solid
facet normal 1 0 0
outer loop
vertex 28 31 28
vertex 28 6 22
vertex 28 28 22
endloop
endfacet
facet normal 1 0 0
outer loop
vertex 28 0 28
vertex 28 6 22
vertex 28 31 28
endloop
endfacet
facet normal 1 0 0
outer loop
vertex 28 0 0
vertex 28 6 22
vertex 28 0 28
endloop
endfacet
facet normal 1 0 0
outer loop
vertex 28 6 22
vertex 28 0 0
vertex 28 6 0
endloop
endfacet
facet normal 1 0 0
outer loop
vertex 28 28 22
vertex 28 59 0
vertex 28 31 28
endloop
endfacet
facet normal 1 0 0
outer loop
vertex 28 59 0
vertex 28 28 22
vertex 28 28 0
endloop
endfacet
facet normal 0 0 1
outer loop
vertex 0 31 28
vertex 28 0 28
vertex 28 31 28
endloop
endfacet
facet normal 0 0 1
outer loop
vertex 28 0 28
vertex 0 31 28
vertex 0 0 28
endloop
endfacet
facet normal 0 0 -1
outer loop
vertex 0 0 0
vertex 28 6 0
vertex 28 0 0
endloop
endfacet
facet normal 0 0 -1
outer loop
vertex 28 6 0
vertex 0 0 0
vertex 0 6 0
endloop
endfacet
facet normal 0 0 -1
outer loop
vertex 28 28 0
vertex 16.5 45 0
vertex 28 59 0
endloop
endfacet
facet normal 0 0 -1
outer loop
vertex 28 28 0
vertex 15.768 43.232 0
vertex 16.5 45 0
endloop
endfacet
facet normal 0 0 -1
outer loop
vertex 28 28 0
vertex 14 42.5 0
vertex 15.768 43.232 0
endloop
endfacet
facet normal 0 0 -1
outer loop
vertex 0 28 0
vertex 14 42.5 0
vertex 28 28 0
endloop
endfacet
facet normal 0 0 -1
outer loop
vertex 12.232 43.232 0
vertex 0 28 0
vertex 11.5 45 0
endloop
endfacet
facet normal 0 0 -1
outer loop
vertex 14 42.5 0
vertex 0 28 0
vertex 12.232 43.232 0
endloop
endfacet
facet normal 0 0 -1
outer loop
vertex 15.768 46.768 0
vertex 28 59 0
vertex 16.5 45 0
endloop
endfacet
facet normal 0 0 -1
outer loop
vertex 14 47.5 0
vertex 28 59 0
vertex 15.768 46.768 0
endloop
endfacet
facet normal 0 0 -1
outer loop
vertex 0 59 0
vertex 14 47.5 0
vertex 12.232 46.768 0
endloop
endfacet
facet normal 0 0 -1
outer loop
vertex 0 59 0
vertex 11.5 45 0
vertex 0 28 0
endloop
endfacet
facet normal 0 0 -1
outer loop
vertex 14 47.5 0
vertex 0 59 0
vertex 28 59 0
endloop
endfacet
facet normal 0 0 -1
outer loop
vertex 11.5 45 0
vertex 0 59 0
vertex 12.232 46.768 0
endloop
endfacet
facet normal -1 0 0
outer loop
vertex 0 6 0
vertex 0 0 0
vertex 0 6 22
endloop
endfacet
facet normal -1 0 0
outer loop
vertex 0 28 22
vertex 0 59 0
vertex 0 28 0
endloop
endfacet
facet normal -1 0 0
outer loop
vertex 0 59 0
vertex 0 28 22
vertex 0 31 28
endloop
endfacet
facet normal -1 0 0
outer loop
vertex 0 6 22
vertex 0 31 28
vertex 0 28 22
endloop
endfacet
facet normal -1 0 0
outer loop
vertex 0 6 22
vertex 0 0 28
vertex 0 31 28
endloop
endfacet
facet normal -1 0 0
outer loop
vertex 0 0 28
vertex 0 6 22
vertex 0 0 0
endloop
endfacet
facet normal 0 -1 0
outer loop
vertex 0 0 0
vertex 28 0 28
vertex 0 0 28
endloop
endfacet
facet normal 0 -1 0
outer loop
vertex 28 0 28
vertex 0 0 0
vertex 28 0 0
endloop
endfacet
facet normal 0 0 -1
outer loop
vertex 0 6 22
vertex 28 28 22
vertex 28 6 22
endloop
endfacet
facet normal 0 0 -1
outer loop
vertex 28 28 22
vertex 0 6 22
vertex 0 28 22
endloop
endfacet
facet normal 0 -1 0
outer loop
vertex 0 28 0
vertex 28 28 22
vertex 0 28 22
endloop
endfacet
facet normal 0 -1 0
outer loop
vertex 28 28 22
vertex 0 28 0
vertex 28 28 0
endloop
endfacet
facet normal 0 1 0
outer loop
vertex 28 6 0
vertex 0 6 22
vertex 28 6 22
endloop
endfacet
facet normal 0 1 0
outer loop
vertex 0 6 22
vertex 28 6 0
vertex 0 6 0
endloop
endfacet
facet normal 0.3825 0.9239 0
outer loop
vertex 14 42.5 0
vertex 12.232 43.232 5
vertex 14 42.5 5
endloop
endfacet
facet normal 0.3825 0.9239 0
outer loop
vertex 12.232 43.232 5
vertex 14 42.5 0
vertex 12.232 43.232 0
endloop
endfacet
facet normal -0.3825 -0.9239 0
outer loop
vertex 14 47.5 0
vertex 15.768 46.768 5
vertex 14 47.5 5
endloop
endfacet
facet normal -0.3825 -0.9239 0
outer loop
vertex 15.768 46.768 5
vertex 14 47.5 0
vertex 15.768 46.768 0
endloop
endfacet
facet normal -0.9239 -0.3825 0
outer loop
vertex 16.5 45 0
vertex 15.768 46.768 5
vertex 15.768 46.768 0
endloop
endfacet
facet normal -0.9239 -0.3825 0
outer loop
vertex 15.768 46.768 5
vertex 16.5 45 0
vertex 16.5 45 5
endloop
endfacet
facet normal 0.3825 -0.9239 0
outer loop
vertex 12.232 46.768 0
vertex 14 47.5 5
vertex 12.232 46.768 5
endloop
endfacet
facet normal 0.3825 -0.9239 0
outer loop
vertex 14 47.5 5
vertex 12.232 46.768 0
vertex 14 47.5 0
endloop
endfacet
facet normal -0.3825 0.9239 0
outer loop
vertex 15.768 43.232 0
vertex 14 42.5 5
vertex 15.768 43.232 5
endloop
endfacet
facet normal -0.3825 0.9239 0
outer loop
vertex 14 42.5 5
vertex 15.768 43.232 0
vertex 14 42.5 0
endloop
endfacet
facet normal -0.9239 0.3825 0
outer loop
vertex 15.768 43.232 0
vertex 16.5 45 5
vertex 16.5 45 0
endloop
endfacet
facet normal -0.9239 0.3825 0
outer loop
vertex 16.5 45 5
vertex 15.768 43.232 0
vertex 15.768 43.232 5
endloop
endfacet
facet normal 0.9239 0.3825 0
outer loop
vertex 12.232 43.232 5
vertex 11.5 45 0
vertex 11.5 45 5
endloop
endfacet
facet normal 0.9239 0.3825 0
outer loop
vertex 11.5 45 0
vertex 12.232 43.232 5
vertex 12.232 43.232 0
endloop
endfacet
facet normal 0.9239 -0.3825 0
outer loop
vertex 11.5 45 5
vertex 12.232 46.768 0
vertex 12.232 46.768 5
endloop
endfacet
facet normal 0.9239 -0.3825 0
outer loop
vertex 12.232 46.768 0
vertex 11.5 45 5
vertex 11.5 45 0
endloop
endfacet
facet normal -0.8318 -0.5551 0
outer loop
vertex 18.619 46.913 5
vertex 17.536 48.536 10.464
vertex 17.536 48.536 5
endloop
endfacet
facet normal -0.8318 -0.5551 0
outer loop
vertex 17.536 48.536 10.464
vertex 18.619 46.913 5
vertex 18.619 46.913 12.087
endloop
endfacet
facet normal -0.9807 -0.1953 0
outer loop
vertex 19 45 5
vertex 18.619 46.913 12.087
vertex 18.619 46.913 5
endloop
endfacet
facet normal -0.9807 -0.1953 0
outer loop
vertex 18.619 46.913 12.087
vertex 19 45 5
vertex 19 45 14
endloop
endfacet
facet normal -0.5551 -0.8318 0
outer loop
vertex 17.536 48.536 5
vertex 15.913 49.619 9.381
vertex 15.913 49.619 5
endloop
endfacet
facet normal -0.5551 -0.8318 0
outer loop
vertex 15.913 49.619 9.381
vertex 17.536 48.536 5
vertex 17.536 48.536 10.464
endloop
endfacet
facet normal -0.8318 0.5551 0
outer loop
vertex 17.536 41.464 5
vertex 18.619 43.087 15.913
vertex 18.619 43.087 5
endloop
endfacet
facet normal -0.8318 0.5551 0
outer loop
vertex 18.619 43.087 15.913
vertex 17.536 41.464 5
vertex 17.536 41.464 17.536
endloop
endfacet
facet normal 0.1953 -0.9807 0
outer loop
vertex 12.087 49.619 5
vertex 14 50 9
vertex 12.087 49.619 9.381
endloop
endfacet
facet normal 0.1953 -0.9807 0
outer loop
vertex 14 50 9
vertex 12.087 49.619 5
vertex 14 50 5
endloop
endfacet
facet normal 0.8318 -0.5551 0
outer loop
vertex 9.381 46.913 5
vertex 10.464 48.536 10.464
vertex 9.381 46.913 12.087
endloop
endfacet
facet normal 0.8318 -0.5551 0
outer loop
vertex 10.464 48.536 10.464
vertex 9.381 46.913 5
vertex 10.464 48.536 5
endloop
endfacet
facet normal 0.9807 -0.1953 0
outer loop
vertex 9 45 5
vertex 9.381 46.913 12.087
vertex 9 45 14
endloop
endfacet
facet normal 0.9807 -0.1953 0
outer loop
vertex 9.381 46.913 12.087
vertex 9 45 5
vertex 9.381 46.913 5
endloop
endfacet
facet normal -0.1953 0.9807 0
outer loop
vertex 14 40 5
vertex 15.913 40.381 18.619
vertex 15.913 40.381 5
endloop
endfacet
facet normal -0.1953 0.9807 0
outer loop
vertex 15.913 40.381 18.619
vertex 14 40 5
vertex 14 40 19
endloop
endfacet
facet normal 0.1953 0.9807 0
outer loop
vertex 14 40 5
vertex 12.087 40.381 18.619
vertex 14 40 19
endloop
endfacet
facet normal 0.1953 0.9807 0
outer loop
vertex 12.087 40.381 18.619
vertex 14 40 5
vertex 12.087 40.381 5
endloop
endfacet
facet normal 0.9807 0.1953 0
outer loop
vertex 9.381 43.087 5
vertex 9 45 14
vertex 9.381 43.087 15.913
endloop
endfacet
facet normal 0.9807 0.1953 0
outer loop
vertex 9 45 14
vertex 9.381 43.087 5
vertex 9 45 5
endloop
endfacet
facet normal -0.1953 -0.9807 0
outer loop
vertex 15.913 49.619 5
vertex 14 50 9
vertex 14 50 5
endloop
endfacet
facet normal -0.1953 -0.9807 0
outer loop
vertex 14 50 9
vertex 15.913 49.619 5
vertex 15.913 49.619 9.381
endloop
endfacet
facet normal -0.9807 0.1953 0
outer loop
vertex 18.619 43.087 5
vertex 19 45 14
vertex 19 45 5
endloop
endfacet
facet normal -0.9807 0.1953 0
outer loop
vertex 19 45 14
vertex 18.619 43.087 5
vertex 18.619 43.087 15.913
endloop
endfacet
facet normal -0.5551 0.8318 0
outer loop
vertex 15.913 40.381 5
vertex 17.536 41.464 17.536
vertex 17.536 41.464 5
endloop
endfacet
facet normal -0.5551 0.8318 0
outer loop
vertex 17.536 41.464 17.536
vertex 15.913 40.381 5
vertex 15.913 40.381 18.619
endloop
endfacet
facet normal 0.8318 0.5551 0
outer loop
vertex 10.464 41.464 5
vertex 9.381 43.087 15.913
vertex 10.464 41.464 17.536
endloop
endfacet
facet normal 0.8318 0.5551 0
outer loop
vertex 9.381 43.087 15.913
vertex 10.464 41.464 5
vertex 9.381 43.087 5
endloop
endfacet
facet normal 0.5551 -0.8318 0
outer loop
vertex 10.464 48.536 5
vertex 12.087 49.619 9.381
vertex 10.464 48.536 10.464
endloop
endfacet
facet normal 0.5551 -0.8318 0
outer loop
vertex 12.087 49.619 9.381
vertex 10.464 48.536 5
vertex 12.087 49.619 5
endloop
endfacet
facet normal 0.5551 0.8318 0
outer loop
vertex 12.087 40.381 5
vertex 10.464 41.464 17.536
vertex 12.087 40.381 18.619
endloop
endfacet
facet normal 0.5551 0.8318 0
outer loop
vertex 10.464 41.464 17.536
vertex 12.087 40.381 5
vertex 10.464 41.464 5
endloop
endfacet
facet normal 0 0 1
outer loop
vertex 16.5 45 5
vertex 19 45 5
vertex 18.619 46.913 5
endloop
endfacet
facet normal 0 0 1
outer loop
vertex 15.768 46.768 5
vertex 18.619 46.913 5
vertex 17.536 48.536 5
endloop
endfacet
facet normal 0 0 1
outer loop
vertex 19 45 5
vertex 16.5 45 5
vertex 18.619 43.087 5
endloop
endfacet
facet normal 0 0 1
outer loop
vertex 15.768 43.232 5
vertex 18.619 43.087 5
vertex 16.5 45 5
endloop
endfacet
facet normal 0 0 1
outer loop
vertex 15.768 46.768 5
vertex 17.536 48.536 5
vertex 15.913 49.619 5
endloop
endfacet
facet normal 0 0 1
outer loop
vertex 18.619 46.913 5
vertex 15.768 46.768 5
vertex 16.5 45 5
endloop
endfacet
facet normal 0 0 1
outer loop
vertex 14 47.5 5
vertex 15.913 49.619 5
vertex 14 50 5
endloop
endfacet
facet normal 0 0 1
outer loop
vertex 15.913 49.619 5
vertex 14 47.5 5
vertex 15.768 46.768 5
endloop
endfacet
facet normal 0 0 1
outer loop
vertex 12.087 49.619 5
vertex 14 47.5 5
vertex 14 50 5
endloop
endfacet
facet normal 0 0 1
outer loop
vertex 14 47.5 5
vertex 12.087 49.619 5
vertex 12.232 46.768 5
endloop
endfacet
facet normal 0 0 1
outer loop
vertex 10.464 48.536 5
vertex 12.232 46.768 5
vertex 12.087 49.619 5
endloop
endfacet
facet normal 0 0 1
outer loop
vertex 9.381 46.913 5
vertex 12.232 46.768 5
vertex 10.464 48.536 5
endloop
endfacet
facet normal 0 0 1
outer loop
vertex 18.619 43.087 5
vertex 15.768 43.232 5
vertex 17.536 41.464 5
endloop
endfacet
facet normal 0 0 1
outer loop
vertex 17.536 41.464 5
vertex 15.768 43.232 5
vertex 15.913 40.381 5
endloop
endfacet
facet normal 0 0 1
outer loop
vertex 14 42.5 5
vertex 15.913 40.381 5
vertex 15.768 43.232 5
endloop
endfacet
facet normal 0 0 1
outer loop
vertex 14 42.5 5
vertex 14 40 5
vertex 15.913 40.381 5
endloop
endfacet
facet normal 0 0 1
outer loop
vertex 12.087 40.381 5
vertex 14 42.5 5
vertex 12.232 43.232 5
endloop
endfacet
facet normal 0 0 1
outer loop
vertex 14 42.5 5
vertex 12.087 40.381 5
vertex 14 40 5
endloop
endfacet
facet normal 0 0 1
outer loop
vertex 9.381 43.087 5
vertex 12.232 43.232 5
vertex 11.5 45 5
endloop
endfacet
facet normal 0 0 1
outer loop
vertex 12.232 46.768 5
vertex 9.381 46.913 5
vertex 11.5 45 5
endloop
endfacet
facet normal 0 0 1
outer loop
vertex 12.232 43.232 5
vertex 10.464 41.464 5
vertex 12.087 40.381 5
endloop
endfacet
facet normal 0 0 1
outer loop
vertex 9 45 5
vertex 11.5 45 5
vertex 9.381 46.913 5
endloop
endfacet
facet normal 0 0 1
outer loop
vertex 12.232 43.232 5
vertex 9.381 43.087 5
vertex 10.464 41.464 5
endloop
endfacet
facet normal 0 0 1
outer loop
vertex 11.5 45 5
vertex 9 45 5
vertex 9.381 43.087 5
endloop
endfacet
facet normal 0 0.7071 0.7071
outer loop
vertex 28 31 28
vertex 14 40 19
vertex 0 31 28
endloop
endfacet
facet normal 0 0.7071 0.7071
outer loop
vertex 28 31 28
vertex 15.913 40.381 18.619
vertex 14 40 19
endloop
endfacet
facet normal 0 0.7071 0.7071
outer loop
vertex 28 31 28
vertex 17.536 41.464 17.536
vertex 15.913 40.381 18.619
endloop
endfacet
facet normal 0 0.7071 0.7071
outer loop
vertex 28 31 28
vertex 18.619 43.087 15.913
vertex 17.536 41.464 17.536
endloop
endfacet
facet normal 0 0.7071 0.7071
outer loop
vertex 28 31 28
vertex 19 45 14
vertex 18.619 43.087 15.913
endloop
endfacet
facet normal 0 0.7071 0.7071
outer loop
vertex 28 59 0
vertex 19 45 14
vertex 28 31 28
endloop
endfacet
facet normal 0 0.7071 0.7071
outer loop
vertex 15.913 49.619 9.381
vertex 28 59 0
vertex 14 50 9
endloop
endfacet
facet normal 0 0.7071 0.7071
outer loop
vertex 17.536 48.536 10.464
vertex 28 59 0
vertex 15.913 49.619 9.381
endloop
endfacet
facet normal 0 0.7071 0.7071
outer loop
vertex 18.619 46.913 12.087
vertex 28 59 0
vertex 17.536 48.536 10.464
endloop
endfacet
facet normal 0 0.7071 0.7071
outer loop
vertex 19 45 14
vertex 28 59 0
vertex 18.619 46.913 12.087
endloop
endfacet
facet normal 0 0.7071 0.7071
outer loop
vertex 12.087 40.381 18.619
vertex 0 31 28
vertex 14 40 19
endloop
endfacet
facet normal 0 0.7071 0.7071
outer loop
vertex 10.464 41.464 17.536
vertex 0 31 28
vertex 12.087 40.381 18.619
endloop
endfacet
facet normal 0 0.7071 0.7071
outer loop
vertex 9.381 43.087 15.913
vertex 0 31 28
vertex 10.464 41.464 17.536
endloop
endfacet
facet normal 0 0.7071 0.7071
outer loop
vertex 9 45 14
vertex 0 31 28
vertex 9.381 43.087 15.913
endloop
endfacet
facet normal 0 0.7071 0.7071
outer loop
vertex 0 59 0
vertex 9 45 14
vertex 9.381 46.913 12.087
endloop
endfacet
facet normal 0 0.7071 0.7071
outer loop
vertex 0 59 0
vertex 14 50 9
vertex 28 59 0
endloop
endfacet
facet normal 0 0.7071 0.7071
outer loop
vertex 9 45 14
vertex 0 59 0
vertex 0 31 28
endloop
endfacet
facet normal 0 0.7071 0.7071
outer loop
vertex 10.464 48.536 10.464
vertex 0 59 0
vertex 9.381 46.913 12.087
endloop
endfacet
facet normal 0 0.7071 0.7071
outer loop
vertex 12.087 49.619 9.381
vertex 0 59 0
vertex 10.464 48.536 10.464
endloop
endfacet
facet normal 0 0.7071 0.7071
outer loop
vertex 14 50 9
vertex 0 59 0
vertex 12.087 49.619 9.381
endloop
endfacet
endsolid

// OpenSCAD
thickness = 6;
clamp_height = 22;
clamp_width = 22;
clamp_depth = 28;

height = clamp_height + thickness;
width = clamp_width + 1.5 * thickness;
depth = clamp_depth;

screw_dia = 5;
screw_head_dia = 10;
screw_lip_height = 5;

mount_height = height;
mount_depth = clamp_depth;
mount_width = clamp_depth;


difference() {
    cube([depth, width, height]);
    translate([-1, thickness, -1])
        cube([clamp_depth + 2, clamp_width, clamp_height + 1]);
}
translate([0, width, 0])
    difference() {
        polyhedron(points = [[0, 0, 0],
                             [0, mount_width, 0],
                             [0, 0, mount_height],
                             [mount_depth, 0, 0],
                             [mount_depth, mount_width, 0],
                             [mount_depth, 0, mount_height]],
                   faces = [[0,1,2],
                            [4,3,5],
                            [0,2,5,3],
                            [4,5,2,1],
                            [0,3,4,1]]);
        union() {
            translate([mount_depth/2, mount_width/2, -1])
                cylinder(d = screw_dia, h = mount_height + 2);
            translate([mount_depth/2, mount_width/2, screw_lip_height])
                cylinder(d = screw_head_dia, h = mount_height +2);
        }
    }
